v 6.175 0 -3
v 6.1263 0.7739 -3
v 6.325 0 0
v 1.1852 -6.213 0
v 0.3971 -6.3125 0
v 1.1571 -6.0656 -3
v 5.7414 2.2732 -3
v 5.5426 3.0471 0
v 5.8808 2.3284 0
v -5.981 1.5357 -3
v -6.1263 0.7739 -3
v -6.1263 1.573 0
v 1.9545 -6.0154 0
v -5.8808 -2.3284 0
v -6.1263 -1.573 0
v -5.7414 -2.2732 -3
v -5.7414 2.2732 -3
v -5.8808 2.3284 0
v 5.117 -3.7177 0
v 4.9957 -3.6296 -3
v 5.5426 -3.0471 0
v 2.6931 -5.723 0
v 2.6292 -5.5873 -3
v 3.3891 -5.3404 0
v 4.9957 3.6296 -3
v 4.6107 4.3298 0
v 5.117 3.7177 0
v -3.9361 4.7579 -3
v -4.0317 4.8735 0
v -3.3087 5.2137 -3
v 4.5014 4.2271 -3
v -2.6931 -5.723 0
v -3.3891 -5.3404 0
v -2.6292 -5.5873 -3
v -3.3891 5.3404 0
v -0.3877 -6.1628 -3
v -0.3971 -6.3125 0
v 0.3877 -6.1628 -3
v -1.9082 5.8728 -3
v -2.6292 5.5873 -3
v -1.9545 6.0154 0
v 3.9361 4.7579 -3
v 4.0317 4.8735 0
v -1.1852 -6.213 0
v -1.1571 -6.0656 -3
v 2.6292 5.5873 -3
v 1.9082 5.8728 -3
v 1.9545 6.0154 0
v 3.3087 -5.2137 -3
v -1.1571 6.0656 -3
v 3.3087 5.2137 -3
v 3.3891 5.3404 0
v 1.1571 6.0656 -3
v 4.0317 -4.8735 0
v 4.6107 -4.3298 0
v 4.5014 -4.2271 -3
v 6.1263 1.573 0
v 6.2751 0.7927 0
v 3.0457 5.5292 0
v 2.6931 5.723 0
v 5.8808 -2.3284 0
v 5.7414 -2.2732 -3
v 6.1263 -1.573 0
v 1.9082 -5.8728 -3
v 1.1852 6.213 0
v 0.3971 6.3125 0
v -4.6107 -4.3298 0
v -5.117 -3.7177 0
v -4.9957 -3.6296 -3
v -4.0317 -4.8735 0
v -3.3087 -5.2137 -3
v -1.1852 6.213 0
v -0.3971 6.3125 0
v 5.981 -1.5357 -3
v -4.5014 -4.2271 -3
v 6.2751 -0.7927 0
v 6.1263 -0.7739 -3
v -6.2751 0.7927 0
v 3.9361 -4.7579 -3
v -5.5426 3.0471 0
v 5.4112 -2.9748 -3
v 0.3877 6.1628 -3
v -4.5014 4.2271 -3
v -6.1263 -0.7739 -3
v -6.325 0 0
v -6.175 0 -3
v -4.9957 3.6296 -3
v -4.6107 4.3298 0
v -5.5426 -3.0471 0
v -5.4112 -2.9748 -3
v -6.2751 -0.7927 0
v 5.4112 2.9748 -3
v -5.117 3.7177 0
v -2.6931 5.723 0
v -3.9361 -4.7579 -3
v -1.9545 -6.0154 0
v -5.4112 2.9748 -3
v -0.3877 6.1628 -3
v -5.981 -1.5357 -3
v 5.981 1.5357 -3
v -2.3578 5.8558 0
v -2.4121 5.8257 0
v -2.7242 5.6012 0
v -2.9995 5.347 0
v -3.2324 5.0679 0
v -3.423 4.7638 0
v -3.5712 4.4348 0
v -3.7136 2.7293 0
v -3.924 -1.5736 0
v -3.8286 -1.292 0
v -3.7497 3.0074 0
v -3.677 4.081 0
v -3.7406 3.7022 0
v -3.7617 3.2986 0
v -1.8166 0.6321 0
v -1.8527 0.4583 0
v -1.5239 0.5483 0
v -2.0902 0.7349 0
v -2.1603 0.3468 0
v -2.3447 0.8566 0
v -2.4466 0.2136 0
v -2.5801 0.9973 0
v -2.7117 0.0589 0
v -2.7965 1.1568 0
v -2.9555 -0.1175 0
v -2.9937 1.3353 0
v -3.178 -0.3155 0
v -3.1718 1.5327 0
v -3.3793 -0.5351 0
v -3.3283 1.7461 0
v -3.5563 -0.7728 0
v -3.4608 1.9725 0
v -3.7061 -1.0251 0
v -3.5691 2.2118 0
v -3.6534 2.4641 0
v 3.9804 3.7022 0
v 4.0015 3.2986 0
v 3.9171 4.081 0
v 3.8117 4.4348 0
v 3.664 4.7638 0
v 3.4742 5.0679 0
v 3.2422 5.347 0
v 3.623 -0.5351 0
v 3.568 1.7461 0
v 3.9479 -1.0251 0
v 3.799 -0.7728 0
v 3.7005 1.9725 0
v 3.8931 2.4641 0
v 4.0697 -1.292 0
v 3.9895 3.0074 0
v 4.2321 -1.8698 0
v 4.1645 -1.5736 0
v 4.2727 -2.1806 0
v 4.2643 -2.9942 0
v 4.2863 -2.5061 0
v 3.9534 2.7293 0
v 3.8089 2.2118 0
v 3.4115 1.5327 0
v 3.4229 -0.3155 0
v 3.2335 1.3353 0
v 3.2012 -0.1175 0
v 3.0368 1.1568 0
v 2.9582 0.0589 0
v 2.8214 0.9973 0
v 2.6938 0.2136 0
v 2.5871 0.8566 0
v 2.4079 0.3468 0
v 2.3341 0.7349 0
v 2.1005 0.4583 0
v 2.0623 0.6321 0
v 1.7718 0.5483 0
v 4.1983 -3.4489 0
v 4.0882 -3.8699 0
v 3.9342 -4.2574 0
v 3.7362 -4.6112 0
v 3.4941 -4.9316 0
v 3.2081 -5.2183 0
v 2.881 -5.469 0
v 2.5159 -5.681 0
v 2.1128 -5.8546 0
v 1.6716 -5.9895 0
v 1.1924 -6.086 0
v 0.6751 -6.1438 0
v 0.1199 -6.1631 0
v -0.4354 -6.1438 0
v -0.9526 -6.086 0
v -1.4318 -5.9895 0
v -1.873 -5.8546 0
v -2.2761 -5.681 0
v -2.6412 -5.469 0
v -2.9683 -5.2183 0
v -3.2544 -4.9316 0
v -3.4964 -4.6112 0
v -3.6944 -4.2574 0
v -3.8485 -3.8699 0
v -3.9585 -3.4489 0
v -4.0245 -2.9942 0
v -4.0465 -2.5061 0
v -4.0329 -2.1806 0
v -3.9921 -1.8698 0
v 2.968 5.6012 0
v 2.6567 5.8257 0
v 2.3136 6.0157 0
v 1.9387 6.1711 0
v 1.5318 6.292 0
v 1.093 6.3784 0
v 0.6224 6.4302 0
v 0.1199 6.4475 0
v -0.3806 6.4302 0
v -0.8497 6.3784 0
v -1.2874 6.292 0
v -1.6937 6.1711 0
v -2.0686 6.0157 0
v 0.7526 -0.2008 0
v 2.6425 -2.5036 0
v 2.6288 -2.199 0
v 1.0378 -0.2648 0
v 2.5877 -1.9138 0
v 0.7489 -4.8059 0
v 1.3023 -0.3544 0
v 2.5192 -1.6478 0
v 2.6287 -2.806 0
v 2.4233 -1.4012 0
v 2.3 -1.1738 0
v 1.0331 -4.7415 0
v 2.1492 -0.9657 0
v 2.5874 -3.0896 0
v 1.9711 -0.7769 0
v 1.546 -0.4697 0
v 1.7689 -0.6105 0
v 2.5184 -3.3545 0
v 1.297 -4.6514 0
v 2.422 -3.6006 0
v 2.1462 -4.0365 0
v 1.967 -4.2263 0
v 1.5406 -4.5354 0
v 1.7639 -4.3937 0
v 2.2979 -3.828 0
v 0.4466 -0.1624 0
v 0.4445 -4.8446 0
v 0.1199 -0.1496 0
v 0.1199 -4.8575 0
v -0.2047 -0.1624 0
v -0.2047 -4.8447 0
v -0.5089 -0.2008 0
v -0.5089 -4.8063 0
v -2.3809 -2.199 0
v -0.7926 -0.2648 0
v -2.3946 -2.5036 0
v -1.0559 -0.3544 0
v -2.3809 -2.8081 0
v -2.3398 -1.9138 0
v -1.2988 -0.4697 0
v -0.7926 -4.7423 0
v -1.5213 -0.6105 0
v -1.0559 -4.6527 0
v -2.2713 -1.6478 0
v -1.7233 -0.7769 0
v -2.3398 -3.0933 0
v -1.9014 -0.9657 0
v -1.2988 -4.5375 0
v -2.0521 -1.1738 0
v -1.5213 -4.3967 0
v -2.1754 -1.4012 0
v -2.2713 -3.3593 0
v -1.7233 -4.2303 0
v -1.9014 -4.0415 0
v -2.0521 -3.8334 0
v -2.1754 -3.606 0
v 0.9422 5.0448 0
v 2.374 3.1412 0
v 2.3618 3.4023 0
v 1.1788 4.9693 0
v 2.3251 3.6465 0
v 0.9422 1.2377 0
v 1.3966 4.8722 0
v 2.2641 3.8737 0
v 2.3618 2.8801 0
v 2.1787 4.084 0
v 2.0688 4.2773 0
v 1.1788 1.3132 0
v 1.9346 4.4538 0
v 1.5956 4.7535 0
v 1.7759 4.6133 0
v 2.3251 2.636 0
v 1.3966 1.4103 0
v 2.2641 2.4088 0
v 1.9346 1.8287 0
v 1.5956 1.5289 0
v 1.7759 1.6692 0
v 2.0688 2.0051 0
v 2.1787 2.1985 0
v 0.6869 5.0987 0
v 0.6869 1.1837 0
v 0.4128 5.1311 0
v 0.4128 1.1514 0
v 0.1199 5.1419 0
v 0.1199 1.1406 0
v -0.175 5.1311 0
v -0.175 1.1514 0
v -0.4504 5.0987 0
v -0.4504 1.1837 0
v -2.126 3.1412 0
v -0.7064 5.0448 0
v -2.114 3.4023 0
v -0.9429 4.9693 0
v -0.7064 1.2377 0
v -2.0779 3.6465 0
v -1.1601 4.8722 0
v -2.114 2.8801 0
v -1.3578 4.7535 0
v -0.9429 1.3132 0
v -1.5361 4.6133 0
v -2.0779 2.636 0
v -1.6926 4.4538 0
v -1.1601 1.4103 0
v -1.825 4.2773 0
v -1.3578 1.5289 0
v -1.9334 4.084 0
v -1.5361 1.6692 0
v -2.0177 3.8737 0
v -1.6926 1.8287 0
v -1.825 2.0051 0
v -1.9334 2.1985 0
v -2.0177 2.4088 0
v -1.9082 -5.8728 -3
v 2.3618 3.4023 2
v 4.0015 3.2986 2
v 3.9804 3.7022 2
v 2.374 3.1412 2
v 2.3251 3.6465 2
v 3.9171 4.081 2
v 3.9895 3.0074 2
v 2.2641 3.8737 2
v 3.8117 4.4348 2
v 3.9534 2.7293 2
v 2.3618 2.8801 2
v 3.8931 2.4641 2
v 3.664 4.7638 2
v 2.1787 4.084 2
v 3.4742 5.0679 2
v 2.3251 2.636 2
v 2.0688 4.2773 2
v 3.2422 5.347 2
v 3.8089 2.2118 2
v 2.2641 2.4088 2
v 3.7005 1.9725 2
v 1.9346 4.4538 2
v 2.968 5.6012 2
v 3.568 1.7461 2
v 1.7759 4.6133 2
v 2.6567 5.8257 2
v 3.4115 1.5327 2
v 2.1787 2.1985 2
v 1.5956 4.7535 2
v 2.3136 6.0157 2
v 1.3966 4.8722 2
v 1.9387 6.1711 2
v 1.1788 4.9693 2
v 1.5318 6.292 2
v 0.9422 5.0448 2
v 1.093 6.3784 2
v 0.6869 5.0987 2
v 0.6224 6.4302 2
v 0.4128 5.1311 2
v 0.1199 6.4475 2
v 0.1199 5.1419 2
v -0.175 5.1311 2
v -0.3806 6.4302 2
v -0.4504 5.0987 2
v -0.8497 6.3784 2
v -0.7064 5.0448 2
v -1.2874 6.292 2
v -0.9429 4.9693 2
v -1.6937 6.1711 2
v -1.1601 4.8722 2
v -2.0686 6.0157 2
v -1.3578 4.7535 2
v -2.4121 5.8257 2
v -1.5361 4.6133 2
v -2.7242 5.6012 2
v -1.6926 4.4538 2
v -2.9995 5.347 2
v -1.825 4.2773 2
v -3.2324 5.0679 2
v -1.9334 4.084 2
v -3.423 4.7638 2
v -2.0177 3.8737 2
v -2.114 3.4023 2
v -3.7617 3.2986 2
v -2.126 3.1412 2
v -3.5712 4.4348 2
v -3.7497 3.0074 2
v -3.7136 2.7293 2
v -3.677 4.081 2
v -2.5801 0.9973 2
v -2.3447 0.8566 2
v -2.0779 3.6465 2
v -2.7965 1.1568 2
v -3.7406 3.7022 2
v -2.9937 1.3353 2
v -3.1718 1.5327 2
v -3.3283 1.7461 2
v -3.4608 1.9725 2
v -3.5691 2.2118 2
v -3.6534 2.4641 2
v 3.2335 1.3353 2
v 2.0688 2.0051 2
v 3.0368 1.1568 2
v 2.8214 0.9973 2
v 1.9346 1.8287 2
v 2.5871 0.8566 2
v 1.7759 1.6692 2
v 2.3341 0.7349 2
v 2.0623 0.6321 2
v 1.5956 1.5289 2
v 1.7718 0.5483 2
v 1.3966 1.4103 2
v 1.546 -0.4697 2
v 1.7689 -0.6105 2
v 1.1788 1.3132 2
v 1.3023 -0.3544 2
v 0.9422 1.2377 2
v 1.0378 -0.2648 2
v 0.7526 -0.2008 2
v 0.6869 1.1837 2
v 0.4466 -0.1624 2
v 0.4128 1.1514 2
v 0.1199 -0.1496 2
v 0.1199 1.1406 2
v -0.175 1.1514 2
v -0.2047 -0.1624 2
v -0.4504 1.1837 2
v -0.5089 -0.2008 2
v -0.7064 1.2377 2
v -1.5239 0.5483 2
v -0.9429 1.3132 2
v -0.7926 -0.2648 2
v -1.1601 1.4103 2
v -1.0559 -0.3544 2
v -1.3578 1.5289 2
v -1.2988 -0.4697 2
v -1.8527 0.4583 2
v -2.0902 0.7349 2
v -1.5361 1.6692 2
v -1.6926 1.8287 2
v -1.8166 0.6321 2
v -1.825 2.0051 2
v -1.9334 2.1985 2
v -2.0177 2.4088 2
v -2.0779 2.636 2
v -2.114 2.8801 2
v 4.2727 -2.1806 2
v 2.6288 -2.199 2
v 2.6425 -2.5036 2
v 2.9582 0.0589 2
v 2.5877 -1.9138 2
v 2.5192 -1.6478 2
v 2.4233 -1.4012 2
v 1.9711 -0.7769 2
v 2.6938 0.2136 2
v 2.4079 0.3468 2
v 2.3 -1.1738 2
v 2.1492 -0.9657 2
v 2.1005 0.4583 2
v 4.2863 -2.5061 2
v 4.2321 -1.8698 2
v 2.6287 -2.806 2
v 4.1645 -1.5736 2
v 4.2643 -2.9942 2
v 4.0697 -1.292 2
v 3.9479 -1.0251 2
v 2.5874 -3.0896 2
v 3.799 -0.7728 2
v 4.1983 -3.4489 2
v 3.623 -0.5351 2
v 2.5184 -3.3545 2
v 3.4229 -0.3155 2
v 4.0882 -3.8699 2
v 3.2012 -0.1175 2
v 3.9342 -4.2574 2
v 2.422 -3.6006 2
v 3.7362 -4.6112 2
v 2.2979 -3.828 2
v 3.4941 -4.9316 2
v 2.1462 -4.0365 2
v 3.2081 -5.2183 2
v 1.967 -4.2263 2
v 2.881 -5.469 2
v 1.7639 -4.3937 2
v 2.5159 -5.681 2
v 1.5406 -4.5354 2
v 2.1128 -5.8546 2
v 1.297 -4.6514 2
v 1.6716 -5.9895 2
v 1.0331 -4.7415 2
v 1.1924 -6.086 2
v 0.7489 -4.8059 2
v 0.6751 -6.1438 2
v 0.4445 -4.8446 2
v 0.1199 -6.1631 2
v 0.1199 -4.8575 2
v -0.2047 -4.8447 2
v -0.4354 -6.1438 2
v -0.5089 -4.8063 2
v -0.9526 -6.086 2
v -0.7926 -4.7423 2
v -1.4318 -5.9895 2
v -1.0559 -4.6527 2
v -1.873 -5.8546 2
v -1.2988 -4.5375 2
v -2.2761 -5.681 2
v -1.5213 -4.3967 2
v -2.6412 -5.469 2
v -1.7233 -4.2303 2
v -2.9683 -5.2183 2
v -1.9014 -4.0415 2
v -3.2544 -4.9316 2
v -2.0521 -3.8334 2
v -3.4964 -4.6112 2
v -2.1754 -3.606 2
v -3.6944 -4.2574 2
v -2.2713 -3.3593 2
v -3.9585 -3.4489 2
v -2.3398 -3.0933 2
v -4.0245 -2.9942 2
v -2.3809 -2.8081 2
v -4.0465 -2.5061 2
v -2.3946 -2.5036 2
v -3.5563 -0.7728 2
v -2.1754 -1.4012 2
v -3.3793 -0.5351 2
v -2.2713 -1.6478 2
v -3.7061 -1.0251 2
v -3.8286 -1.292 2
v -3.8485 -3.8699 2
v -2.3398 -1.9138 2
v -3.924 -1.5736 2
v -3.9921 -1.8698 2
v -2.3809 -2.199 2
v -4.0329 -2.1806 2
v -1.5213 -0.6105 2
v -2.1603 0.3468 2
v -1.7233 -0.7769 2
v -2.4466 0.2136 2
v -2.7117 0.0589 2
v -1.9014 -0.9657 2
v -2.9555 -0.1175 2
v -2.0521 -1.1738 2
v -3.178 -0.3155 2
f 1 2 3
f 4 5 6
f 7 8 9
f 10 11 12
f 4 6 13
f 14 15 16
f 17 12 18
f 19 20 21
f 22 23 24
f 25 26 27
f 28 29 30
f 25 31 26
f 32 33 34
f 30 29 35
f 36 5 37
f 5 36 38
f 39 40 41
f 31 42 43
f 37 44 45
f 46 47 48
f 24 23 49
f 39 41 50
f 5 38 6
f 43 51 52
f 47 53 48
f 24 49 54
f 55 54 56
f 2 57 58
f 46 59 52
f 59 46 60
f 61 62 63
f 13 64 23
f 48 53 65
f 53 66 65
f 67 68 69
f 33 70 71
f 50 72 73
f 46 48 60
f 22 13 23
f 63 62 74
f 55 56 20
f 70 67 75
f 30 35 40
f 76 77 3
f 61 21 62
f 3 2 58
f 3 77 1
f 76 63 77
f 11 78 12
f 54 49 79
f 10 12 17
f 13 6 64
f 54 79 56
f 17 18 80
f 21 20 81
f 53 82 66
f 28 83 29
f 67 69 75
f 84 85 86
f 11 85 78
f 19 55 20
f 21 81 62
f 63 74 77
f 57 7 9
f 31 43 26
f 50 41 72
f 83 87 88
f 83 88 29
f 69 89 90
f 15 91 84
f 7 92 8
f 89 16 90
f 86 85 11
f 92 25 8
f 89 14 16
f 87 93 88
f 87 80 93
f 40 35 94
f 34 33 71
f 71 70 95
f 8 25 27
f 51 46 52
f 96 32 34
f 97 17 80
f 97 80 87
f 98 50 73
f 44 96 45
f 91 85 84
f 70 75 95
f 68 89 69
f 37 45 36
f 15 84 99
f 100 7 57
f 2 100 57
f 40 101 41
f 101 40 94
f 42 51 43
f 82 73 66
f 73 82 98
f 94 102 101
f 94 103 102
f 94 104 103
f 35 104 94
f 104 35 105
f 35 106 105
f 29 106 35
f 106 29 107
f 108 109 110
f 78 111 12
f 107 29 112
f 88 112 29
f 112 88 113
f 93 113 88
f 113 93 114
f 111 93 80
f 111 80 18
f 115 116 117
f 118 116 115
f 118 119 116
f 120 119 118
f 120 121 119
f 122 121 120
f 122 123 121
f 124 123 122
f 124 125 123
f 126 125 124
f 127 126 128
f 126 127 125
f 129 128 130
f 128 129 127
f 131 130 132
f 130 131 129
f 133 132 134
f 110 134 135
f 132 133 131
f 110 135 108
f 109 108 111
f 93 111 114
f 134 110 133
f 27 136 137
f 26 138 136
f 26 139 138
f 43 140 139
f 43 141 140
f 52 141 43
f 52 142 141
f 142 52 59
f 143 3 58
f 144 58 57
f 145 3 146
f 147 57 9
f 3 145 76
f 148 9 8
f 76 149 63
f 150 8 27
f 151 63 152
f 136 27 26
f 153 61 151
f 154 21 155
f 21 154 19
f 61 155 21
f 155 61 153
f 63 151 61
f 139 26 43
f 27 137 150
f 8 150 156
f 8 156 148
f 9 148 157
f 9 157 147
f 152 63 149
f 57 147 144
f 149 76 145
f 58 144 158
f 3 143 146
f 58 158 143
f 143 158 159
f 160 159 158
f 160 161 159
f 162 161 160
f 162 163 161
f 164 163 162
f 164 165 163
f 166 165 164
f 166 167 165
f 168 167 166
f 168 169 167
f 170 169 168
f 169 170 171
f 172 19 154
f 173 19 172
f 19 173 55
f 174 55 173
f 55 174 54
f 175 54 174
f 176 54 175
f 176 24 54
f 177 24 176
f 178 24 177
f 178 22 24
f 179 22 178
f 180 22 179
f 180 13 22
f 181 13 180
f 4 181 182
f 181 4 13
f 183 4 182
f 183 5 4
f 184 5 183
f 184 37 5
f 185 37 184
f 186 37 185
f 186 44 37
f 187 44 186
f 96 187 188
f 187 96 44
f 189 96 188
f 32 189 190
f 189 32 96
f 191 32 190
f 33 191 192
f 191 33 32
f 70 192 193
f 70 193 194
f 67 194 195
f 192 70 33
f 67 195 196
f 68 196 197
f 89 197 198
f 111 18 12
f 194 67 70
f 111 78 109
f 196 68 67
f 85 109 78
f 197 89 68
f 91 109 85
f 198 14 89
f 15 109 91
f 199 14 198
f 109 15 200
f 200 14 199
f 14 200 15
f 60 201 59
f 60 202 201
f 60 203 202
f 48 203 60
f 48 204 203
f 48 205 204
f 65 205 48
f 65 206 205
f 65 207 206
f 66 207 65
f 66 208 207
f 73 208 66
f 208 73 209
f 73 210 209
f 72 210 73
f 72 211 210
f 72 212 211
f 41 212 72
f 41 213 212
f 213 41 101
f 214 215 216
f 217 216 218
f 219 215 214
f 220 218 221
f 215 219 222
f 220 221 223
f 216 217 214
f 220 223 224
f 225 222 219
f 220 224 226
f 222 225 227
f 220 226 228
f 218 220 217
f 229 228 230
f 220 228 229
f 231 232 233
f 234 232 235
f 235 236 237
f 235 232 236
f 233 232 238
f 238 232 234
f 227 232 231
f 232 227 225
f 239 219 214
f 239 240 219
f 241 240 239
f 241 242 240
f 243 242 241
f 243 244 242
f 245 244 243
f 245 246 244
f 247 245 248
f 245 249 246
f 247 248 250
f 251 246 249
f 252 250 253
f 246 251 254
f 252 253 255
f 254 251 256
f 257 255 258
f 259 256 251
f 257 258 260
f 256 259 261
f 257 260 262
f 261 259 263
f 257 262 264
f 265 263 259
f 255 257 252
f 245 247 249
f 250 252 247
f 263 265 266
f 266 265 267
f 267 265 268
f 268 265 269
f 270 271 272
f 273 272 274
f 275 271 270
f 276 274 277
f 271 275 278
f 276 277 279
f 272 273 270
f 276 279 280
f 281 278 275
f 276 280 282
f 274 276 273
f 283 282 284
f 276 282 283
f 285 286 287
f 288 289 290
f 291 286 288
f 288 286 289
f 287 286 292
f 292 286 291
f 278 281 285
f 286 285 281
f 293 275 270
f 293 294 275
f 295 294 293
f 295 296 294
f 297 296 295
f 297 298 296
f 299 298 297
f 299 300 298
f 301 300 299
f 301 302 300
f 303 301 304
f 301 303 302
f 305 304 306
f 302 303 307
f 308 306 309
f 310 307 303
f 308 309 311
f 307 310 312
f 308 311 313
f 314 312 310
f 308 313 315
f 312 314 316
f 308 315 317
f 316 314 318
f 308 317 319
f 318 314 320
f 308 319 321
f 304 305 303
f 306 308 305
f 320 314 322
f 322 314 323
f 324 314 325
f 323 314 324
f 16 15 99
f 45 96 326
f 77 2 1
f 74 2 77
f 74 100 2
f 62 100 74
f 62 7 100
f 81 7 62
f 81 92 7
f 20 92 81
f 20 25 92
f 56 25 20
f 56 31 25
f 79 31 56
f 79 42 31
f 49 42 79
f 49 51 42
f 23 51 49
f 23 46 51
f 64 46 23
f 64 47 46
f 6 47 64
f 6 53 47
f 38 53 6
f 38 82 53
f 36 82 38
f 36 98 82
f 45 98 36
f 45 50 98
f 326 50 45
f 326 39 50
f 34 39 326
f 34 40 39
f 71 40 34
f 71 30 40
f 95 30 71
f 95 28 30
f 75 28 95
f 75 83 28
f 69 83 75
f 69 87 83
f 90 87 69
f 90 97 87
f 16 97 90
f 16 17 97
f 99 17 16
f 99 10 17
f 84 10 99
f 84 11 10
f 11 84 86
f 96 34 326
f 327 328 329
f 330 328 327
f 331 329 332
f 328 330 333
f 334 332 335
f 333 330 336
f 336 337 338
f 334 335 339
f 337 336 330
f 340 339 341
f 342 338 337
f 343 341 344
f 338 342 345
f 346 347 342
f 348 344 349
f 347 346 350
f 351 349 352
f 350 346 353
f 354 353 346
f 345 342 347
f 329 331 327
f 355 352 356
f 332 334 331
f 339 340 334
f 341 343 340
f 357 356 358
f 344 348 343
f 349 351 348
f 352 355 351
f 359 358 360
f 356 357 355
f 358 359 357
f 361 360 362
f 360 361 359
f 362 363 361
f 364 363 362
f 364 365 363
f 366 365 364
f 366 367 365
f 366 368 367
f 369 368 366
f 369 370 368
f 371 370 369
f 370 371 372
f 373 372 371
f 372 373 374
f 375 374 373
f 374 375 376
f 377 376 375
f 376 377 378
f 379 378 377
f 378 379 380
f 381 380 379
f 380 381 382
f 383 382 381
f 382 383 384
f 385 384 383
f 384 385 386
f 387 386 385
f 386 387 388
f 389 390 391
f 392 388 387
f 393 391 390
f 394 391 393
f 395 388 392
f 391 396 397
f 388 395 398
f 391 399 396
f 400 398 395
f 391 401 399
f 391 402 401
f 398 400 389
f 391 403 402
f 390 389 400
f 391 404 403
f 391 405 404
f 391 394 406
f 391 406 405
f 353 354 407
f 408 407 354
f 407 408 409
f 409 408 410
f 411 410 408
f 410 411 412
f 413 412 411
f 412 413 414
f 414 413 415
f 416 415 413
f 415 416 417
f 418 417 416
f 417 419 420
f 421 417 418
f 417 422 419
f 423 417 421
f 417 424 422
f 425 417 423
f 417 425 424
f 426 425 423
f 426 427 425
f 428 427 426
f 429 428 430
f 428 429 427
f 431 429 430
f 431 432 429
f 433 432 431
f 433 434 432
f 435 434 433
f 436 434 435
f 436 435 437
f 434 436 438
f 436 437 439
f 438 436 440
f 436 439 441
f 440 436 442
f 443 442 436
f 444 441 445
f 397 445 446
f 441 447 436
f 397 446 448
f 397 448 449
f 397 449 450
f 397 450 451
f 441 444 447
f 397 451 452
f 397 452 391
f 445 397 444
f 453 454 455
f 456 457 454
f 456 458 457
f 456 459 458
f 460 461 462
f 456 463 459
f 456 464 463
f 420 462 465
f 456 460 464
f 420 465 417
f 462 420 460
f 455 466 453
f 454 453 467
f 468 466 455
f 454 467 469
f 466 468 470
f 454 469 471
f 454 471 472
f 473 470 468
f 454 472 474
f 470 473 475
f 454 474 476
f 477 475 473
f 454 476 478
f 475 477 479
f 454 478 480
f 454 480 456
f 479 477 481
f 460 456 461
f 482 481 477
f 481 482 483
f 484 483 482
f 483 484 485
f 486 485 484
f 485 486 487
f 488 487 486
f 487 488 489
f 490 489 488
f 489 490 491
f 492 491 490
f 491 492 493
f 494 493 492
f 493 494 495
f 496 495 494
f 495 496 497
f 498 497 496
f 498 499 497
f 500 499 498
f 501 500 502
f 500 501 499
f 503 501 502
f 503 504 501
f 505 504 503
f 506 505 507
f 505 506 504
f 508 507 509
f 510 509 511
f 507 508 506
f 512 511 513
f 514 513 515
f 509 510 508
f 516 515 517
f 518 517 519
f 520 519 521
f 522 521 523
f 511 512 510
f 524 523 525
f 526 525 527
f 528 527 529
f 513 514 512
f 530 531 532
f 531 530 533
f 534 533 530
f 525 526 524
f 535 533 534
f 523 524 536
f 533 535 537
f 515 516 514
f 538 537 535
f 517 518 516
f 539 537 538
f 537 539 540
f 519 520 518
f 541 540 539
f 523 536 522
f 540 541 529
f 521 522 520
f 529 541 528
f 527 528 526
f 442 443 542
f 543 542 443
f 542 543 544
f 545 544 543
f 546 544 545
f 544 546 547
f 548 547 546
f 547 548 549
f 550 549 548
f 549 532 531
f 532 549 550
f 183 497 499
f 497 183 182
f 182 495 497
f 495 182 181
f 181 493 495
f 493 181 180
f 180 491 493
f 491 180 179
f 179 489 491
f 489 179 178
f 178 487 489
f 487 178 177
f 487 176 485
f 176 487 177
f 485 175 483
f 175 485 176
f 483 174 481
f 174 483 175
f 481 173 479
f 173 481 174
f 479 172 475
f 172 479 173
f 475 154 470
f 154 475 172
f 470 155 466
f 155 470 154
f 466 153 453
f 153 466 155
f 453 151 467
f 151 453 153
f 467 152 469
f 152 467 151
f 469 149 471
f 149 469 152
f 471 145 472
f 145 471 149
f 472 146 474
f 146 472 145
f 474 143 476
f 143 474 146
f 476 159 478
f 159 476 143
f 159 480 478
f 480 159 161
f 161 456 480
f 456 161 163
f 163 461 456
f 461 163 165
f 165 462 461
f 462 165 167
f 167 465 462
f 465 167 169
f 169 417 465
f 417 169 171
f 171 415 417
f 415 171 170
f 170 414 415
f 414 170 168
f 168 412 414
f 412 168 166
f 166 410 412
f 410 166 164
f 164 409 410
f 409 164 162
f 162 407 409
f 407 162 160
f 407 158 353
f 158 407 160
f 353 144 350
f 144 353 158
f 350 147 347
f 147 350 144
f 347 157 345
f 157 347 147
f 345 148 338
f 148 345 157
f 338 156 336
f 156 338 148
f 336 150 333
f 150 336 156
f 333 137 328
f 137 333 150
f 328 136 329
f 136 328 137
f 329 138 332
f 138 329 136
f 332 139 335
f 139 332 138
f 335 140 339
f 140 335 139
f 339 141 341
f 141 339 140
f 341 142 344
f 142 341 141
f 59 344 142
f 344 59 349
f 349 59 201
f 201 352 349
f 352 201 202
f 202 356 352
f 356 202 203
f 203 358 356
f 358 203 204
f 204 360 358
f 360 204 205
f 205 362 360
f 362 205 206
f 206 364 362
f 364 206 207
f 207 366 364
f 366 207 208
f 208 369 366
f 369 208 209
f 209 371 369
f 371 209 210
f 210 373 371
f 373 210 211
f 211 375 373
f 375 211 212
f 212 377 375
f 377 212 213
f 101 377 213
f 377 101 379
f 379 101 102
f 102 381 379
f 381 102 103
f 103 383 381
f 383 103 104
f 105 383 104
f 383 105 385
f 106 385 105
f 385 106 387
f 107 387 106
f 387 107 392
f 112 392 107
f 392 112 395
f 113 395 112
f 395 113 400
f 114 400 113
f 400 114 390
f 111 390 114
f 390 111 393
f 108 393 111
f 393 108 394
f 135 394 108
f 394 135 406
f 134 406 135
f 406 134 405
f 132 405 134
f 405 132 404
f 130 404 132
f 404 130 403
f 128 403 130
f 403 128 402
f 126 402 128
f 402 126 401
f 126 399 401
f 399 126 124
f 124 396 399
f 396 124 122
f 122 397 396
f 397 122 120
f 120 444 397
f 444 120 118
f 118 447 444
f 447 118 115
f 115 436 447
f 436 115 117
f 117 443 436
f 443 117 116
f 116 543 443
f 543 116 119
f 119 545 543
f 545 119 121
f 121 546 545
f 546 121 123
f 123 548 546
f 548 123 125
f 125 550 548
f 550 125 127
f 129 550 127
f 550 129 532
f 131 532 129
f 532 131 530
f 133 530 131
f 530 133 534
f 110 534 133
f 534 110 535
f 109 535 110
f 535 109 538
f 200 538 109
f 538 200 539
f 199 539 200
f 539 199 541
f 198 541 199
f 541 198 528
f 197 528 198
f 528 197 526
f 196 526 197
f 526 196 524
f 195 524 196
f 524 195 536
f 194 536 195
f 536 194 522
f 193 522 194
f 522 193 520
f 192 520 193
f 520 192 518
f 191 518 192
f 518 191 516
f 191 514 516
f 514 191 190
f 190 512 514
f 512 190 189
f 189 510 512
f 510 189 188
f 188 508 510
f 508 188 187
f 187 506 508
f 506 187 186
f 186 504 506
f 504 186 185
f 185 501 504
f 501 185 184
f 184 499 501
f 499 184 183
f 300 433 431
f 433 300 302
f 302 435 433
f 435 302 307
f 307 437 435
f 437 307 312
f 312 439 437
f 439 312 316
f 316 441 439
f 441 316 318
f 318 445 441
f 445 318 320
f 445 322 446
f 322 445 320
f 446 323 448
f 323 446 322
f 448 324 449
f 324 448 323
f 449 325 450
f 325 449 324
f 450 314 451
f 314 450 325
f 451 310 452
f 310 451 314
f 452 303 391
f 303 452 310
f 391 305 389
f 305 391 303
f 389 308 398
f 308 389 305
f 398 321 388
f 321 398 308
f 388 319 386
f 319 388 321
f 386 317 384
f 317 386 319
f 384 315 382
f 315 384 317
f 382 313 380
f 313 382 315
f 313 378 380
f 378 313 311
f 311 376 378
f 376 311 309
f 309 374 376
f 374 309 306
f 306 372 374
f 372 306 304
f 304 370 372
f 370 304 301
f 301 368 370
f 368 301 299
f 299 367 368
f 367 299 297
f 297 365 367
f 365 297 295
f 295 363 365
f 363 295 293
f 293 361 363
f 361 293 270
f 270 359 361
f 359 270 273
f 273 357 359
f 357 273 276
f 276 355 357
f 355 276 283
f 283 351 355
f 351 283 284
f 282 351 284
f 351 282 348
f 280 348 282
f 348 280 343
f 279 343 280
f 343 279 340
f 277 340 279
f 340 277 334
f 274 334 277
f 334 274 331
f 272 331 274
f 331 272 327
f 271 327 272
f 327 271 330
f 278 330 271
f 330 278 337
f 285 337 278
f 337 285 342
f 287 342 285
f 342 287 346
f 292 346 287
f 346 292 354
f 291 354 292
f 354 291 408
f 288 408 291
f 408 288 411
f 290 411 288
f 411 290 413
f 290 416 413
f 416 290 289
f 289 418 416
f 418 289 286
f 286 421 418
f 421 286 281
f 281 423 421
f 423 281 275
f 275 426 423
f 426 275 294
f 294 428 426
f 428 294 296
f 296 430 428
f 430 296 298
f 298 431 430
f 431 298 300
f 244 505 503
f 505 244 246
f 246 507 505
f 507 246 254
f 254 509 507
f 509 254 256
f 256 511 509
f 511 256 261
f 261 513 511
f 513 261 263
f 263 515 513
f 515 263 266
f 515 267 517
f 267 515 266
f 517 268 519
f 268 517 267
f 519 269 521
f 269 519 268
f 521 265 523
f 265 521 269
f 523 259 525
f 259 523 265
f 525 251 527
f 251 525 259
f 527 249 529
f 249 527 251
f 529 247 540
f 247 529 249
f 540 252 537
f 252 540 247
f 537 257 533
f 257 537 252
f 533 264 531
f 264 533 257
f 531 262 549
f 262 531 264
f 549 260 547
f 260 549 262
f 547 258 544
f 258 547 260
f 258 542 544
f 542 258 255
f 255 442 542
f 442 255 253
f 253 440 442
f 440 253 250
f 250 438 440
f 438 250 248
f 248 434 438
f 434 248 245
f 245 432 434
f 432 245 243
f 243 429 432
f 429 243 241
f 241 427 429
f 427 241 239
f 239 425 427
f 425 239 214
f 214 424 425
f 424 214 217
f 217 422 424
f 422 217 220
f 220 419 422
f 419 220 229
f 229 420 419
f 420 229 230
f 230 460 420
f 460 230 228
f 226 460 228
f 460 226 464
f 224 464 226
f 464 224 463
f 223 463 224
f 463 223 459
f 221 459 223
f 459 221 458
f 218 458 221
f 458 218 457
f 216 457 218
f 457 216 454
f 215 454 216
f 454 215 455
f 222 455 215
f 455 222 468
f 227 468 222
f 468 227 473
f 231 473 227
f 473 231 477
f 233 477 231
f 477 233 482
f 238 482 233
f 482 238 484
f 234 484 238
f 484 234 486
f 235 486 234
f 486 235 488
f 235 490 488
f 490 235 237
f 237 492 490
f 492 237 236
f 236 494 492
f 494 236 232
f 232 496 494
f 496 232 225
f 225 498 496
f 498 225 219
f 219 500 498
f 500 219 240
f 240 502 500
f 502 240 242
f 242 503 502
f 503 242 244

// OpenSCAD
$fn = 50;


difference() {
	union() {
		translate(v = [0, 0, -3.0000000000]) {
			cylinder(h = 3, r1 = 6.1750000000, r2 = 6.3250000000);
		}
		linear_extrude(height = 2) {
			text(font = "Impact", halign = "center", size = 12, text = "8", valign = "center");
		}
	}
	union();
}
